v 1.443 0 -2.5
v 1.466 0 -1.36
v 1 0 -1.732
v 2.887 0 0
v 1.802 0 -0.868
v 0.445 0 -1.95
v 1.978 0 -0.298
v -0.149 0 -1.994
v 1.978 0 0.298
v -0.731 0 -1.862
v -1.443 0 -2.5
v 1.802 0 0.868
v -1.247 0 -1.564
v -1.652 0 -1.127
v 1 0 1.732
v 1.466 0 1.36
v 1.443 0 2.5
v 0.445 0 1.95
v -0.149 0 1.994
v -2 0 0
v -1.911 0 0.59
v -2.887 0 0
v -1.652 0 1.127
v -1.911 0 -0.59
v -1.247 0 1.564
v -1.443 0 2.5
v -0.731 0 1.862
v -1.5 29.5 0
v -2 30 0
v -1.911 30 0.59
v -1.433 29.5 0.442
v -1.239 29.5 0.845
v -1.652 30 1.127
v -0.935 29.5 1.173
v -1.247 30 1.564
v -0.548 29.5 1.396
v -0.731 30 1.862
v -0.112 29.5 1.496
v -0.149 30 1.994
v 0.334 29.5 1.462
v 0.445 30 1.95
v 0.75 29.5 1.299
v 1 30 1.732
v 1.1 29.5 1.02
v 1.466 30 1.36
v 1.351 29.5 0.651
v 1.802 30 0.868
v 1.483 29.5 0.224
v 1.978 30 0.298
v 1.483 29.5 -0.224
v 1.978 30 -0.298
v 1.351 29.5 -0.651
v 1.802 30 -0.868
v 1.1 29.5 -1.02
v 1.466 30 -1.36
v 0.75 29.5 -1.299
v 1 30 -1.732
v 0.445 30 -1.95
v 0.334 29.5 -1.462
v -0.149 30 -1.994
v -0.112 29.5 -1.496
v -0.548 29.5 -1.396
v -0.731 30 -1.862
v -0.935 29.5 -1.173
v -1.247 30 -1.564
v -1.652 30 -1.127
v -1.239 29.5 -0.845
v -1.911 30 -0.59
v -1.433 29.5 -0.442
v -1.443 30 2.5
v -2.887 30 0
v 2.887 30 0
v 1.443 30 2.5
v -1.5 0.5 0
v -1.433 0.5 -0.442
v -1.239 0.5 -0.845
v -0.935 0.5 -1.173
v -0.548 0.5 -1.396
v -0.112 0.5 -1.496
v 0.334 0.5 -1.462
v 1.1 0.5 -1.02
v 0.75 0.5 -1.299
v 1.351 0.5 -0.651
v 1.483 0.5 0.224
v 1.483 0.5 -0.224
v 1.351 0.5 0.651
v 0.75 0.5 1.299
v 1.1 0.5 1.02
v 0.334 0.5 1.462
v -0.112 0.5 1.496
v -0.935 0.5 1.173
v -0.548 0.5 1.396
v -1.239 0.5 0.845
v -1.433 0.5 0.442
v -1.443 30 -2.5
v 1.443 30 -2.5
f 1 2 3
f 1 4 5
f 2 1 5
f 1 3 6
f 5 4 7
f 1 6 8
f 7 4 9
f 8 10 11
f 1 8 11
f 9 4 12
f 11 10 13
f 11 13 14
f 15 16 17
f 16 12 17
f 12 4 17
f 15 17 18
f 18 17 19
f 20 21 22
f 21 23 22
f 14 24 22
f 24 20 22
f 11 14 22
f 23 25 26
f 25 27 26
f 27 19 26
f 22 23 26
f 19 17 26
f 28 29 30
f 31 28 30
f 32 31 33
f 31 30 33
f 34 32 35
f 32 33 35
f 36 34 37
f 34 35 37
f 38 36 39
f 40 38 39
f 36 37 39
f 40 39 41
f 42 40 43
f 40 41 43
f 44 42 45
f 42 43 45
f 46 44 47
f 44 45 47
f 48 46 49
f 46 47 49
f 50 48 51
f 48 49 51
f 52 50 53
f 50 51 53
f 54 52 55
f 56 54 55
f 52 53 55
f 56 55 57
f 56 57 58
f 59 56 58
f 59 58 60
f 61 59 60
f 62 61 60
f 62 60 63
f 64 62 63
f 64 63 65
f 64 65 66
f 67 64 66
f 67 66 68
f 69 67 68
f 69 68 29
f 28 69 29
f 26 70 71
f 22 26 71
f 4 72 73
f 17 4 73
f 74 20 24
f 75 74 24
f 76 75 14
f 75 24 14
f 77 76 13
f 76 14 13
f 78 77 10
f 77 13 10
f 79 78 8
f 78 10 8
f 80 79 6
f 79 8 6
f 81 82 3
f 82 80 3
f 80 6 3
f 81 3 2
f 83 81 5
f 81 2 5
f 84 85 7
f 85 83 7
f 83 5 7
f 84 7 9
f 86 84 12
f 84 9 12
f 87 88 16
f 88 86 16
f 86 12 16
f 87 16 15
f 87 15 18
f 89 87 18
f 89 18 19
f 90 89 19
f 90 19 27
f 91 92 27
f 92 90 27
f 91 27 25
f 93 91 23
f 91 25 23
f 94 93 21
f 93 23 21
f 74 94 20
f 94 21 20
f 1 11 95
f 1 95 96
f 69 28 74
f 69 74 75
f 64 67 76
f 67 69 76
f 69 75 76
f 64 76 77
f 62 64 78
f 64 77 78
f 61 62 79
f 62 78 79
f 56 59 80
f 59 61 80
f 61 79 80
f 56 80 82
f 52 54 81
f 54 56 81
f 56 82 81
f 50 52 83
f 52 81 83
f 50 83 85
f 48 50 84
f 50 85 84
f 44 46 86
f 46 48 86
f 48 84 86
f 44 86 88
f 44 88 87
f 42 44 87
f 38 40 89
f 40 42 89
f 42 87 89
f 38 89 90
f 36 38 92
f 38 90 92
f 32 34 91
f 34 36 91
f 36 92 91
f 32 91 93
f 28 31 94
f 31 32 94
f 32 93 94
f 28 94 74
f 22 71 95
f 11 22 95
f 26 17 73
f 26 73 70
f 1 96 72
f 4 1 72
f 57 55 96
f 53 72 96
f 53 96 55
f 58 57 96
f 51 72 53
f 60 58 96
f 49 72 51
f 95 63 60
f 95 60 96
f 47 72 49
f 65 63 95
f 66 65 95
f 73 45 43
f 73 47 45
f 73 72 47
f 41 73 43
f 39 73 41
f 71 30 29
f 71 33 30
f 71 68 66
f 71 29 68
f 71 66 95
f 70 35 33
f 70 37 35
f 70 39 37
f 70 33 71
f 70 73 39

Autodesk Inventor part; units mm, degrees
ref_plane "YZ Plane" through (0, 0, 0) normal (1, 0, 0) x (0, 1, 0)
ref_plane "XZ Plane" through (0, 0, 0) normal (0, 1, 0) x (-1, 0, 0)
ref_plane "XY Plane" through (0, 0, 0) normal (0, 0, 1) x (1, 0, 0)
sketch "Esboço1" plane through (0, 0, 0) normal (0, 1, 0) x (-1, 0, 0)
  line L0 (-1.4434, -2.5) -> (-2.8868, 0)
  line L1 (-2.8868, 0) -> (-1.4434, 2.5)
  line L2 (-1.4434, 2.5) -> (1.4434, 2.5)
  line L3 (1.4434, 2.5) -> (2.8868, 0)
  line L4 (2.8868, 0) -> (1.4434, -2.5)
  line L5 (1.4434, -2.5) -> (-1.4434, -2.5)
  circle A0 centre (0, 0) radius 1.5
  point P0 (0, -2.5)
extrude "Extrusão1" add sketch "Esboço1" along normal blind 30
chamfer "Chanfro1" distance 0.5 angle 45 2 edges at (1.5, 30, 0) (1.5, 0, 0)
thread "Rosca1" size "M3x0.5" class "6H" standard "ANSI Metric M Profile" full length
properties part number "suporte" material "Latão, amarelo macio, soldado"
